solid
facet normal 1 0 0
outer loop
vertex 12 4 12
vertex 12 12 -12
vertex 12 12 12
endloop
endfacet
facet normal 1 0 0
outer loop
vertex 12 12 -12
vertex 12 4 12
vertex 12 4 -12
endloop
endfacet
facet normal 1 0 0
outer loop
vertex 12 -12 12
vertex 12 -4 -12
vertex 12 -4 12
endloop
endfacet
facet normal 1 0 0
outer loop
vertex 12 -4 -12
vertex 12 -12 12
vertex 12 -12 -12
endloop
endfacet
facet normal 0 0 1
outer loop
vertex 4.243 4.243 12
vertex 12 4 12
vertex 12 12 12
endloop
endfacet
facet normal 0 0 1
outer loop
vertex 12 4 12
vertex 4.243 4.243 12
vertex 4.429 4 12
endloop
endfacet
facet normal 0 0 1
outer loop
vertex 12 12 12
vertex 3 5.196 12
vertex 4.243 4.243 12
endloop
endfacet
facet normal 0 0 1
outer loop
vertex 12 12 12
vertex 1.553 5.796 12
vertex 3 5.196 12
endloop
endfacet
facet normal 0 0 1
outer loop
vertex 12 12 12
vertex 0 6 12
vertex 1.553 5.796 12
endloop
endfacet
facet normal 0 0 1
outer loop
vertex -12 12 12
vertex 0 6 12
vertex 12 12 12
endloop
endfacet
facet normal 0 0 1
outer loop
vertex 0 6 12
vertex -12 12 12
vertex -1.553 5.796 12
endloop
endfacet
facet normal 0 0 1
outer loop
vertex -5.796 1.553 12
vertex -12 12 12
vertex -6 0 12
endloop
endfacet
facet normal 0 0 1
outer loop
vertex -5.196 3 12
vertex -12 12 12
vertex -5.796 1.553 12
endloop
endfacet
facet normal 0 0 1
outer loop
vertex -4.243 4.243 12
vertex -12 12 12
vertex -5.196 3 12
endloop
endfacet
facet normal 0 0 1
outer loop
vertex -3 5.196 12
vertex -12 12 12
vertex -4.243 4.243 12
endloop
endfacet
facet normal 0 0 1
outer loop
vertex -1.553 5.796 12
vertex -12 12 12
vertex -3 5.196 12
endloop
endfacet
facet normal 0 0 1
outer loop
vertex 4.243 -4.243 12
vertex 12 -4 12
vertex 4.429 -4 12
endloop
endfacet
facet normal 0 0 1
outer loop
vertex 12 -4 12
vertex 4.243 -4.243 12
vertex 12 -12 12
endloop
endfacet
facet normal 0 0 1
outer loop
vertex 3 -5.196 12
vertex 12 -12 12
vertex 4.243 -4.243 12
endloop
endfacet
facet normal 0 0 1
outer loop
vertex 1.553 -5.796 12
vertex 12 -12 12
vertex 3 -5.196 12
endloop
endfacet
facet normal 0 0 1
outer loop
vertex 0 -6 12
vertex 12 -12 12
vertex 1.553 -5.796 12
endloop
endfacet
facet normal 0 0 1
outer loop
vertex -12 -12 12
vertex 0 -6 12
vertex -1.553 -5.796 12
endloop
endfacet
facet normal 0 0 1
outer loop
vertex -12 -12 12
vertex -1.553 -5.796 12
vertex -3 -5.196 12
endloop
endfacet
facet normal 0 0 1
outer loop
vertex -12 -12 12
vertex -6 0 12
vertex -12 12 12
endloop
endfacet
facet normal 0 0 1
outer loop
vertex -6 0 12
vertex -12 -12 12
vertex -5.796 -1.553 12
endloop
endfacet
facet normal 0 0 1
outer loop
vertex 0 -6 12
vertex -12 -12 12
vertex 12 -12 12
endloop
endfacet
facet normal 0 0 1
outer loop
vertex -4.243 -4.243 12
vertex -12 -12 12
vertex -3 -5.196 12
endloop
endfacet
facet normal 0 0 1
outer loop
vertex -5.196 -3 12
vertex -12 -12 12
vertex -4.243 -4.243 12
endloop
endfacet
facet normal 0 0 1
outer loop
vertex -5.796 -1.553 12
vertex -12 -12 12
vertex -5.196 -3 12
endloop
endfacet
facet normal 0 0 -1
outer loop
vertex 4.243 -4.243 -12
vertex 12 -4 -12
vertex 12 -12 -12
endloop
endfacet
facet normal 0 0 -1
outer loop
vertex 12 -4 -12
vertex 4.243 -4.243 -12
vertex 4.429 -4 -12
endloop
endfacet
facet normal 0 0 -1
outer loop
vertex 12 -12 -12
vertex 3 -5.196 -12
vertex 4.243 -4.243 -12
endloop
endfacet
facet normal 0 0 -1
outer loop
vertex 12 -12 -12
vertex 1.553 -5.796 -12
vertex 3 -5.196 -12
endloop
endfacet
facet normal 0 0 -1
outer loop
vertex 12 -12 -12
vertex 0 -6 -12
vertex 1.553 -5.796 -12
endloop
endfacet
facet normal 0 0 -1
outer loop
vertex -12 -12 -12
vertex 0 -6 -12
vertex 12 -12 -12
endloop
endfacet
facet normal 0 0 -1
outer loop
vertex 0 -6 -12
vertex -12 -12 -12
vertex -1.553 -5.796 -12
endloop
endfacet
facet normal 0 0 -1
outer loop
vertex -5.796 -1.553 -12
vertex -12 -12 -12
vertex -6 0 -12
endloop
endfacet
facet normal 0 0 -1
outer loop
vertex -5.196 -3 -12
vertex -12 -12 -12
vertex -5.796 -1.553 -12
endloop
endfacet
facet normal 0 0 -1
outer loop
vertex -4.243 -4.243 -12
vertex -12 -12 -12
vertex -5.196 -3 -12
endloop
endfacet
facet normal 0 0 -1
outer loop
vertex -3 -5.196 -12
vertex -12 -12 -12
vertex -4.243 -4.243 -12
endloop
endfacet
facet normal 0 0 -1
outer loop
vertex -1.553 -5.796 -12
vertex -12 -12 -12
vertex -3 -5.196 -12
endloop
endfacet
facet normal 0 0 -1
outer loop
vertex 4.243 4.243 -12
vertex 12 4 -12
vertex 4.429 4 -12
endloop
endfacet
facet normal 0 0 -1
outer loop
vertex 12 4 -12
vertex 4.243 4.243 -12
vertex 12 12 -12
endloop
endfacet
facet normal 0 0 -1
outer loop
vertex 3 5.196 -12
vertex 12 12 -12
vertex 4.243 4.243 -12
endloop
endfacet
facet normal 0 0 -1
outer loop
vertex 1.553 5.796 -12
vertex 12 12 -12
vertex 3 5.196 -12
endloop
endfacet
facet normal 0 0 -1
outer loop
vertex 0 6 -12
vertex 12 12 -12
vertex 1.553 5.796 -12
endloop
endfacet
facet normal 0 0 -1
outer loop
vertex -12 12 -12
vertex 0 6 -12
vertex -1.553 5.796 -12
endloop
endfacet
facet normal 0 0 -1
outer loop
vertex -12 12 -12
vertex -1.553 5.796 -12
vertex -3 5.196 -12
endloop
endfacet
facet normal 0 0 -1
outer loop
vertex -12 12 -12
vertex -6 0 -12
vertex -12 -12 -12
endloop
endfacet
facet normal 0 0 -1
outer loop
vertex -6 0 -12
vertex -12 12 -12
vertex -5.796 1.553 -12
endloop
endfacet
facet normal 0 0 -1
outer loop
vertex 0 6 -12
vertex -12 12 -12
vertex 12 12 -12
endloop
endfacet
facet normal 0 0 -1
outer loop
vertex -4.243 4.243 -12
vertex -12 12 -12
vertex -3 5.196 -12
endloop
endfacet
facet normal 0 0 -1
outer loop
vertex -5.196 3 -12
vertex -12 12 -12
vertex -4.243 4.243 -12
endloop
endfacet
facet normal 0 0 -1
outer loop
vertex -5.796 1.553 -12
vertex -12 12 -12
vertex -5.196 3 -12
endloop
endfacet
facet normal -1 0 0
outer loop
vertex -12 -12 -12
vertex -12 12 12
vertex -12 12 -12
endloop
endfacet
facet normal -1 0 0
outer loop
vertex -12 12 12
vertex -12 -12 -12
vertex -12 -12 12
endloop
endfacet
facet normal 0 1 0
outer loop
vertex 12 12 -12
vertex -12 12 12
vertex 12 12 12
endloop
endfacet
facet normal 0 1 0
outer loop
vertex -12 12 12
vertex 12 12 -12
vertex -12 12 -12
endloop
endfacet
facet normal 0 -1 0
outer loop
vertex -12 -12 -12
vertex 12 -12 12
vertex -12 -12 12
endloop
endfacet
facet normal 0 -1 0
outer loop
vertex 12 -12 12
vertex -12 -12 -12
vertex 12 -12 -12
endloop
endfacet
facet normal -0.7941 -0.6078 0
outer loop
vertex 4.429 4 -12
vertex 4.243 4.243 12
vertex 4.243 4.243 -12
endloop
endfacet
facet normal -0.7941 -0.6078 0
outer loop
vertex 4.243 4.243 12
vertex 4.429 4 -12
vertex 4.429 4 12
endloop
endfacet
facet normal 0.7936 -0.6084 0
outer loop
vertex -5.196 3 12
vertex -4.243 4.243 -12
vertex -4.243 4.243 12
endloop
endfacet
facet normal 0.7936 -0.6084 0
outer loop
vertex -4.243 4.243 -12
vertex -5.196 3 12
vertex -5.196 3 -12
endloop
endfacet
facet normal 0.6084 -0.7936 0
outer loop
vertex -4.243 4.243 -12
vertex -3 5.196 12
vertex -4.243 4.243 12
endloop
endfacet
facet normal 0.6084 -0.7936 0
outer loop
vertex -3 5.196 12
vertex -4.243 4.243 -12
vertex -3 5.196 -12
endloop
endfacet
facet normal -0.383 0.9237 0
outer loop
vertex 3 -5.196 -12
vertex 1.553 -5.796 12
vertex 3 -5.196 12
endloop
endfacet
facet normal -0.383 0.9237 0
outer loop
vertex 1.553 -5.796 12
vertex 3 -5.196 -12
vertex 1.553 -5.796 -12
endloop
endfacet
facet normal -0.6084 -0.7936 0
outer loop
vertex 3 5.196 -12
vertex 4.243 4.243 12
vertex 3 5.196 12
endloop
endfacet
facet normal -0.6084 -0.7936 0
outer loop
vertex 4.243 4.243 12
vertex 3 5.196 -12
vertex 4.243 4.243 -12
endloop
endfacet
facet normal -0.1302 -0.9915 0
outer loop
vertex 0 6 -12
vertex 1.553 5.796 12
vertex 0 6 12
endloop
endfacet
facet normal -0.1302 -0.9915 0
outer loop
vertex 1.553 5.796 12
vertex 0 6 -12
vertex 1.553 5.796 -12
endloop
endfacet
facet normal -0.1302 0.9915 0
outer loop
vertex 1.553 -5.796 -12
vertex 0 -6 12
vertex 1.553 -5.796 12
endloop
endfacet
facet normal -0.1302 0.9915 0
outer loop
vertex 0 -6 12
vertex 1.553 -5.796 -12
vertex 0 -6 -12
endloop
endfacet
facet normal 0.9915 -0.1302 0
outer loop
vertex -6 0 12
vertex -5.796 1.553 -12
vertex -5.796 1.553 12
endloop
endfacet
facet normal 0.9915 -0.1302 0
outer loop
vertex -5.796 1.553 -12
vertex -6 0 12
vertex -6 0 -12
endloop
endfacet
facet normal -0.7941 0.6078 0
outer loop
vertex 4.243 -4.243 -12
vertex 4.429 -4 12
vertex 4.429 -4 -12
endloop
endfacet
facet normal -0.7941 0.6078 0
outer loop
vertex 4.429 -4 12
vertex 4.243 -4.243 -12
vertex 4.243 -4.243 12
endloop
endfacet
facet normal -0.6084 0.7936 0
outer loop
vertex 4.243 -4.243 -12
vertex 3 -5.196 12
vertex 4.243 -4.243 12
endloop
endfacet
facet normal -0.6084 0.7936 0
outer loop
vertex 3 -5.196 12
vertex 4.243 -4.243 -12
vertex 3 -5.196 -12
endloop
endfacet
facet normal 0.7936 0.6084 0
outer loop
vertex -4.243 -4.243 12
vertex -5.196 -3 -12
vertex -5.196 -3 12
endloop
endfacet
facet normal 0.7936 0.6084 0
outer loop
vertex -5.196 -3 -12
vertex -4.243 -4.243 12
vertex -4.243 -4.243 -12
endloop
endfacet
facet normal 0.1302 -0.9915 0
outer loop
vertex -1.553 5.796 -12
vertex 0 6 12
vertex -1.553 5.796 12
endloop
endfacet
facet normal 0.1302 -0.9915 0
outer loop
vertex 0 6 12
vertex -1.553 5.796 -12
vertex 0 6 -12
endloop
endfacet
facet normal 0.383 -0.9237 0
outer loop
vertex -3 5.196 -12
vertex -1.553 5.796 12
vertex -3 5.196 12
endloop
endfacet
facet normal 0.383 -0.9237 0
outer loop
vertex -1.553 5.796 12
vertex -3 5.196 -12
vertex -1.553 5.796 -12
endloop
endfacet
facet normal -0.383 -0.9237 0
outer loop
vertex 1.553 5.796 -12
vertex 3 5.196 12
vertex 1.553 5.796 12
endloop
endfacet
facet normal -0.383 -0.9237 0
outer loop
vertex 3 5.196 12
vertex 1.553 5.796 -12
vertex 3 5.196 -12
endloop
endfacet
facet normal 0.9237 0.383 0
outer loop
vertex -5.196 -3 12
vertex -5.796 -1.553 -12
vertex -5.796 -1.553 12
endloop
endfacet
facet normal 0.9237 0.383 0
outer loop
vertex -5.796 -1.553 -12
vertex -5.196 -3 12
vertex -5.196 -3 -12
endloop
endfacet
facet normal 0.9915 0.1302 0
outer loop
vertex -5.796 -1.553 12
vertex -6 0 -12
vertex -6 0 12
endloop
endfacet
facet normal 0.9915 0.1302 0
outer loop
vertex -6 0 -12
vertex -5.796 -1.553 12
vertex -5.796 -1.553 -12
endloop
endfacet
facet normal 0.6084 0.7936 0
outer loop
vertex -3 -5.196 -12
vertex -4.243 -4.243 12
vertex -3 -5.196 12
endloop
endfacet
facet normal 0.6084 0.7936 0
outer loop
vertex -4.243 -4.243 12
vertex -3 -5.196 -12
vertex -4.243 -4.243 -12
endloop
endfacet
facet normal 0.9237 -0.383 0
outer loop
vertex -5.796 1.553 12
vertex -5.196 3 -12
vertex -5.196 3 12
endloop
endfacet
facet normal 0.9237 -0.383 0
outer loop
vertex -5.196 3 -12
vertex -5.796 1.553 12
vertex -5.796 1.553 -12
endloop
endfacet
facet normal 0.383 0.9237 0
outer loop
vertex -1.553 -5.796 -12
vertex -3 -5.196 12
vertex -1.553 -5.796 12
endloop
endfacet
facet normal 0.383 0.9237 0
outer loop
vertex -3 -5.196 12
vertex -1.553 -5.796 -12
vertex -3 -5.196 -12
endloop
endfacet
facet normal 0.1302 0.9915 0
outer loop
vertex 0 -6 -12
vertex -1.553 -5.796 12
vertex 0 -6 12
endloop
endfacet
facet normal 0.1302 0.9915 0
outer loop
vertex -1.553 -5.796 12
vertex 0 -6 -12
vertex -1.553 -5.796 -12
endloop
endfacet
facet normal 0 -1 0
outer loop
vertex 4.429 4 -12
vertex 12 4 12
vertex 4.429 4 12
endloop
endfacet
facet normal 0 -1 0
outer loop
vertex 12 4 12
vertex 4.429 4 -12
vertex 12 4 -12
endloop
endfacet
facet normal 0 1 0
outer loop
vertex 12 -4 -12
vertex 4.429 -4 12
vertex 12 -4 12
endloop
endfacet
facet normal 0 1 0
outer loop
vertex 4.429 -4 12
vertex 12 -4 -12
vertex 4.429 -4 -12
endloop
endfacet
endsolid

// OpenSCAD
difference() {
    render(convexity=6) difference() {
        cube([24,24,24],center=true);
        cylinder(h=30,r=6,center=true,$fn=24);
    }
    translate([8,0,0]) cube([8,8,30],center=true);
}
